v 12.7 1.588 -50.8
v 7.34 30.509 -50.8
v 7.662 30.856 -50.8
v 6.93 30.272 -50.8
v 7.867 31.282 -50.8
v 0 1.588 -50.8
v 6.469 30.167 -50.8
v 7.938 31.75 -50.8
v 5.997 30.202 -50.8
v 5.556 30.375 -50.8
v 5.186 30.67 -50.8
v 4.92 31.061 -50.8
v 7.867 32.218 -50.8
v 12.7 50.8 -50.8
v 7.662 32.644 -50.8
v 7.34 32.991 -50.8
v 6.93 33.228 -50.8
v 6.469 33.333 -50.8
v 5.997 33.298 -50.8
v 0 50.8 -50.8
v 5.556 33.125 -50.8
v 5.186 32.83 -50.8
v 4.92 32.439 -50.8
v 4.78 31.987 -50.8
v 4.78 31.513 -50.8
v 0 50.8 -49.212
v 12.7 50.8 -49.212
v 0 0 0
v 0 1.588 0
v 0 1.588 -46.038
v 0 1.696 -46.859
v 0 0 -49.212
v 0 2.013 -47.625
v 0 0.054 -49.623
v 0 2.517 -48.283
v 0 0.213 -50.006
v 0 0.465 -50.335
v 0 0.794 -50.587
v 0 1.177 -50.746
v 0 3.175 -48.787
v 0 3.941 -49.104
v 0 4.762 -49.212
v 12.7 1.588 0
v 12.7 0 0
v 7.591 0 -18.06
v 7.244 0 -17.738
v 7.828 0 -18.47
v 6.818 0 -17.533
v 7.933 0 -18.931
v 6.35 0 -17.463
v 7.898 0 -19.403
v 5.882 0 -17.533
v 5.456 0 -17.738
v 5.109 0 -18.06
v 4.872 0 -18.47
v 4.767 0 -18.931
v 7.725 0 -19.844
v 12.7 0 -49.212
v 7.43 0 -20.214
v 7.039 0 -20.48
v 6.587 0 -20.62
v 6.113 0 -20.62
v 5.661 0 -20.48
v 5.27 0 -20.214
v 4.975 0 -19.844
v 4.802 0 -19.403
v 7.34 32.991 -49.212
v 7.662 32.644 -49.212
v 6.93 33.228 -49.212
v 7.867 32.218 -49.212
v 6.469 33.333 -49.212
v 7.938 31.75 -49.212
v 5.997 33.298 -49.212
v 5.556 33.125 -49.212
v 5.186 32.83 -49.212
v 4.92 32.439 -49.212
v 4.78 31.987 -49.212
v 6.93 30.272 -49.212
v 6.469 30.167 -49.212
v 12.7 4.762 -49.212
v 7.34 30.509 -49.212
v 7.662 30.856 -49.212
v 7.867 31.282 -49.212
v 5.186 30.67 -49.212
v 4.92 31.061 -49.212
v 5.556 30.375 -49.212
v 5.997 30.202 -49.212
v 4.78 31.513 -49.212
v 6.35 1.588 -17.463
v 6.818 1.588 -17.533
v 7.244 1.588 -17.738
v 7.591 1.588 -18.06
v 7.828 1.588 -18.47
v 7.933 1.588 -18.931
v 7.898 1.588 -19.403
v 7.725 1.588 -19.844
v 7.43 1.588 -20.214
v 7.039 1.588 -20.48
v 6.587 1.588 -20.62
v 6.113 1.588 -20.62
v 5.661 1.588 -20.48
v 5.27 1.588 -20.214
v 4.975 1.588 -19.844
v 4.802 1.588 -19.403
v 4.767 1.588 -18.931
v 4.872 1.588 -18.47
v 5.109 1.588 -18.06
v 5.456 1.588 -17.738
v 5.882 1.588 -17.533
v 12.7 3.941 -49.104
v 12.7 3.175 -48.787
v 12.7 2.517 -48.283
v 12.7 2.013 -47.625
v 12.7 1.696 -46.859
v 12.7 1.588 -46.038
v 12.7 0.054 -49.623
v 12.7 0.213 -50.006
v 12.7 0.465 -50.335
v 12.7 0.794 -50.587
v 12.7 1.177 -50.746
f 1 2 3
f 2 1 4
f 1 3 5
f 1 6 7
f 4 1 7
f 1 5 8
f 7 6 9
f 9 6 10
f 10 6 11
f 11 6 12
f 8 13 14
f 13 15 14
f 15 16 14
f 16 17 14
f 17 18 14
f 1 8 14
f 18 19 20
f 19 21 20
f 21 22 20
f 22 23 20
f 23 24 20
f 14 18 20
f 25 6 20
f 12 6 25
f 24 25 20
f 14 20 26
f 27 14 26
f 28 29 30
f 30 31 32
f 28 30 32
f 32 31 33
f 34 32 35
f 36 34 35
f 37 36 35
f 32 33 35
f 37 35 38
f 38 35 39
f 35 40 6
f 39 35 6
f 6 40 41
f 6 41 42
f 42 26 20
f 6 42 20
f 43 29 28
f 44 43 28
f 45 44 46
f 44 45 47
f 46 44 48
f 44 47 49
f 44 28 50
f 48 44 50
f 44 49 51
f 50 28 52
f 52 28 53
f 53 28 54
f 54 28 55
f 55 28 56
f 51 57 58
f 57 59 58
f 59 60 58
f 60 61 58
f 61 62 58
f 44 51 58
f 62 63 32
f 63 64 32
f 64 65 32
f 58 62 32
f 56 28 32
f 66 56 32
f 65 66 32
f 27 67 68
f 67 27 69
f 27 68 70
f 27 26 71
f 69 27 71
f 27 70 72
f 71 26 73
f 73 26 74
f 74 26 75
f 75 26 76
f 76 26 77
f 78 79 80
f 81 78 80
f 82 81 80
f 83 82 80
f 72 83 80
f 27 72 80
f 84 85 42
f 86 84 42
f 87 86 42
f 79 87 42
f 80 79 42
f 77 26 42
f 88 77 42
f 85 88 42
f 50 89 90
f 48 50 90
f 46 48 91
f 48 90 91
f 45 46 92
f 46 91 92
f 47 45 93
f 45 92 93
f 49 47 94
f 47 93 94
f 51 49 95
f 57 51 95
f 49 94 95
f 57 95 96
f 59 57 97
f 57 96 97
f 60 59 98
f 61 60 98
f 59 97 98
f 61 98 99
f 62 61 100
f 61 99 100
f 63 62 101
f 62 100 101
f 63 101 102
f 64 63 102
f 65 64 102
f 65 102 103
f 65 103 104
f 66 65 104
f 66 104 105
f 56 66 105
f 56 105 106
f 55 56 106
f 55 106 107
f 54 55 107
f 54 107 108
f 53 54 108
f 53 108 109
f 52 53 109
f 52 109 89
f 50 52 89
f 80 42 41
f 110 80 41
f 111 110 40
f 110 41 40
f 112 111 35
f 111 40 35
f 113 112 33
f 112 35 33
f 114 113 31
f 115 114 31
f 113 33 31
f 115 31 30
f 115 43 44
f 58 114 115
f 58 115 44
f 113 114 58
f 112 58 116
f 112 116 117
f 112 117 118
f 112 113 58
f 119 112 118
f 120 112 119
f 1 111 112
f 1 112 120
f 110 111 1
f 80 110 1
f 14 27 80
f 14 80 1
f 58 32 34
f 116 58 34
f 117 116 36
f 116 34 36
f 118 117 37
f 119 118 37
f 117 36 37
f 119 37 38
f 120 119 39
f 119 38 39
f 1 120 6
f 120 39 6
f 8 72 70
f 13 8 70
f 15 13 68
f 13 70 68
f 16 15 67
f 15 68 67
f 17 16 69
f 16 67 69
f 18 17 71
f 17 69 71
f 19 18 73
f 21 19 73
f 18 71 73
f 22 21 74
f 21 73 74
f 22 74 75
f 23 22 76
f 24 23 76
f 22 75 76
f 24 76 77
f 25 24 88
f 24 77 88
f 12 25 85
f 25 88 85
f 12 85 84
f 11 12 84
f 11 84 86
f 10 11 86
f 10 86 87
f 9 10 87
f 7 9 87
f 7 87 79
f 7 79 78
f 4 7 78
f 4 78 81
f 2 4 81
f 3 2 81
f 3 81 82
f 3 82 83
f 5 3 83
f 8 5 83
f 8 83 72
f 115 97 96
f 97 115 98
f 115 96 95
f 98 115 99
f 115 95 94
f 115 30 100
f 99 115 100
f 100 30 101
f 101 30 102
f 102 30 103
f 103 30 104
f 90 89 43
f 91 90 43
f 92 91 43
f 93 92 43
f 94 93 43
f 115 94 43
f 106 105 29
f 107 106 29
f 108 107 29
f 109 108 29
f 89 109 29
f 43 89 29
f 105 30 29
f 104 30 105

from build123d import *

# Parameters (mm, degrees)
BOSS_EXTRUDE1_DEPTH = 12.7
SKETCH2_R           = 1.5875
CUT_EXTRUDE1_DEPTH  = 17.526
SKETCH3_R           = 1.5875
CUT_EXTRUDE2_DEPTH  = 17.526


with BuildPart() as part:
    # Sketch1 → Boss-Extrude1 (new body)
    with BuildSketch(Plane(origin=(0, 0, 0), x_dir=(0, 0, -1), z_dir=(1, 0, 0))):
        with BuildLine():
            Line((0, 0), (49.2125, 0))
            ThreePointArc((49.2125, 0), (50.335032015, 0.464967985), (50.8, 1.5875))
            Line((50.8, 1.5875), (50.8, 50.8))
            Line((50.8, 50.8), (49.2125, 50.8))
            Line((49.2125, 50.8), (49.2125, 4.7625))
            ThreePointArc((49.2125, 4.7625), (48.28256403, 2.51743597), (46.0375, 1.5875))
            Line((46.0375, 1.5875), (0, 1.5875))
            Line((0, 1.5875), (0, 0))
        make_face()
    extrude(amount=BOSS_EXTRUDE1_DEPTH)

    # Sketch2 → Cut-Extrude1 (cut)
    with BuildSketch(Plane.XY.offset(-49.2125)):
        with Locations((6.35, 31.75)):
            Circle(SKETCH2_R)
    extrude(amount=-CUT_EXTRUDE1_DEPTH, mode=Mode.SUBTRACT)

    # Sketch3 → Cut-Extrude2 (cut)
    with BuildSketch(Plane(origin=(0, 1.5875, 0), x_dir=(1, 0, 0), z_dir=(0, 1, 0))):
        with Locations(Location((6.35, 19.05, 0), (0, 0, 270))):
            Circle(SKETCH3_R)
    extrude(amount=-CUT_EXTRUDE2_DEPTH, mode=Mode.SUBTRACT)


solid = part.part
